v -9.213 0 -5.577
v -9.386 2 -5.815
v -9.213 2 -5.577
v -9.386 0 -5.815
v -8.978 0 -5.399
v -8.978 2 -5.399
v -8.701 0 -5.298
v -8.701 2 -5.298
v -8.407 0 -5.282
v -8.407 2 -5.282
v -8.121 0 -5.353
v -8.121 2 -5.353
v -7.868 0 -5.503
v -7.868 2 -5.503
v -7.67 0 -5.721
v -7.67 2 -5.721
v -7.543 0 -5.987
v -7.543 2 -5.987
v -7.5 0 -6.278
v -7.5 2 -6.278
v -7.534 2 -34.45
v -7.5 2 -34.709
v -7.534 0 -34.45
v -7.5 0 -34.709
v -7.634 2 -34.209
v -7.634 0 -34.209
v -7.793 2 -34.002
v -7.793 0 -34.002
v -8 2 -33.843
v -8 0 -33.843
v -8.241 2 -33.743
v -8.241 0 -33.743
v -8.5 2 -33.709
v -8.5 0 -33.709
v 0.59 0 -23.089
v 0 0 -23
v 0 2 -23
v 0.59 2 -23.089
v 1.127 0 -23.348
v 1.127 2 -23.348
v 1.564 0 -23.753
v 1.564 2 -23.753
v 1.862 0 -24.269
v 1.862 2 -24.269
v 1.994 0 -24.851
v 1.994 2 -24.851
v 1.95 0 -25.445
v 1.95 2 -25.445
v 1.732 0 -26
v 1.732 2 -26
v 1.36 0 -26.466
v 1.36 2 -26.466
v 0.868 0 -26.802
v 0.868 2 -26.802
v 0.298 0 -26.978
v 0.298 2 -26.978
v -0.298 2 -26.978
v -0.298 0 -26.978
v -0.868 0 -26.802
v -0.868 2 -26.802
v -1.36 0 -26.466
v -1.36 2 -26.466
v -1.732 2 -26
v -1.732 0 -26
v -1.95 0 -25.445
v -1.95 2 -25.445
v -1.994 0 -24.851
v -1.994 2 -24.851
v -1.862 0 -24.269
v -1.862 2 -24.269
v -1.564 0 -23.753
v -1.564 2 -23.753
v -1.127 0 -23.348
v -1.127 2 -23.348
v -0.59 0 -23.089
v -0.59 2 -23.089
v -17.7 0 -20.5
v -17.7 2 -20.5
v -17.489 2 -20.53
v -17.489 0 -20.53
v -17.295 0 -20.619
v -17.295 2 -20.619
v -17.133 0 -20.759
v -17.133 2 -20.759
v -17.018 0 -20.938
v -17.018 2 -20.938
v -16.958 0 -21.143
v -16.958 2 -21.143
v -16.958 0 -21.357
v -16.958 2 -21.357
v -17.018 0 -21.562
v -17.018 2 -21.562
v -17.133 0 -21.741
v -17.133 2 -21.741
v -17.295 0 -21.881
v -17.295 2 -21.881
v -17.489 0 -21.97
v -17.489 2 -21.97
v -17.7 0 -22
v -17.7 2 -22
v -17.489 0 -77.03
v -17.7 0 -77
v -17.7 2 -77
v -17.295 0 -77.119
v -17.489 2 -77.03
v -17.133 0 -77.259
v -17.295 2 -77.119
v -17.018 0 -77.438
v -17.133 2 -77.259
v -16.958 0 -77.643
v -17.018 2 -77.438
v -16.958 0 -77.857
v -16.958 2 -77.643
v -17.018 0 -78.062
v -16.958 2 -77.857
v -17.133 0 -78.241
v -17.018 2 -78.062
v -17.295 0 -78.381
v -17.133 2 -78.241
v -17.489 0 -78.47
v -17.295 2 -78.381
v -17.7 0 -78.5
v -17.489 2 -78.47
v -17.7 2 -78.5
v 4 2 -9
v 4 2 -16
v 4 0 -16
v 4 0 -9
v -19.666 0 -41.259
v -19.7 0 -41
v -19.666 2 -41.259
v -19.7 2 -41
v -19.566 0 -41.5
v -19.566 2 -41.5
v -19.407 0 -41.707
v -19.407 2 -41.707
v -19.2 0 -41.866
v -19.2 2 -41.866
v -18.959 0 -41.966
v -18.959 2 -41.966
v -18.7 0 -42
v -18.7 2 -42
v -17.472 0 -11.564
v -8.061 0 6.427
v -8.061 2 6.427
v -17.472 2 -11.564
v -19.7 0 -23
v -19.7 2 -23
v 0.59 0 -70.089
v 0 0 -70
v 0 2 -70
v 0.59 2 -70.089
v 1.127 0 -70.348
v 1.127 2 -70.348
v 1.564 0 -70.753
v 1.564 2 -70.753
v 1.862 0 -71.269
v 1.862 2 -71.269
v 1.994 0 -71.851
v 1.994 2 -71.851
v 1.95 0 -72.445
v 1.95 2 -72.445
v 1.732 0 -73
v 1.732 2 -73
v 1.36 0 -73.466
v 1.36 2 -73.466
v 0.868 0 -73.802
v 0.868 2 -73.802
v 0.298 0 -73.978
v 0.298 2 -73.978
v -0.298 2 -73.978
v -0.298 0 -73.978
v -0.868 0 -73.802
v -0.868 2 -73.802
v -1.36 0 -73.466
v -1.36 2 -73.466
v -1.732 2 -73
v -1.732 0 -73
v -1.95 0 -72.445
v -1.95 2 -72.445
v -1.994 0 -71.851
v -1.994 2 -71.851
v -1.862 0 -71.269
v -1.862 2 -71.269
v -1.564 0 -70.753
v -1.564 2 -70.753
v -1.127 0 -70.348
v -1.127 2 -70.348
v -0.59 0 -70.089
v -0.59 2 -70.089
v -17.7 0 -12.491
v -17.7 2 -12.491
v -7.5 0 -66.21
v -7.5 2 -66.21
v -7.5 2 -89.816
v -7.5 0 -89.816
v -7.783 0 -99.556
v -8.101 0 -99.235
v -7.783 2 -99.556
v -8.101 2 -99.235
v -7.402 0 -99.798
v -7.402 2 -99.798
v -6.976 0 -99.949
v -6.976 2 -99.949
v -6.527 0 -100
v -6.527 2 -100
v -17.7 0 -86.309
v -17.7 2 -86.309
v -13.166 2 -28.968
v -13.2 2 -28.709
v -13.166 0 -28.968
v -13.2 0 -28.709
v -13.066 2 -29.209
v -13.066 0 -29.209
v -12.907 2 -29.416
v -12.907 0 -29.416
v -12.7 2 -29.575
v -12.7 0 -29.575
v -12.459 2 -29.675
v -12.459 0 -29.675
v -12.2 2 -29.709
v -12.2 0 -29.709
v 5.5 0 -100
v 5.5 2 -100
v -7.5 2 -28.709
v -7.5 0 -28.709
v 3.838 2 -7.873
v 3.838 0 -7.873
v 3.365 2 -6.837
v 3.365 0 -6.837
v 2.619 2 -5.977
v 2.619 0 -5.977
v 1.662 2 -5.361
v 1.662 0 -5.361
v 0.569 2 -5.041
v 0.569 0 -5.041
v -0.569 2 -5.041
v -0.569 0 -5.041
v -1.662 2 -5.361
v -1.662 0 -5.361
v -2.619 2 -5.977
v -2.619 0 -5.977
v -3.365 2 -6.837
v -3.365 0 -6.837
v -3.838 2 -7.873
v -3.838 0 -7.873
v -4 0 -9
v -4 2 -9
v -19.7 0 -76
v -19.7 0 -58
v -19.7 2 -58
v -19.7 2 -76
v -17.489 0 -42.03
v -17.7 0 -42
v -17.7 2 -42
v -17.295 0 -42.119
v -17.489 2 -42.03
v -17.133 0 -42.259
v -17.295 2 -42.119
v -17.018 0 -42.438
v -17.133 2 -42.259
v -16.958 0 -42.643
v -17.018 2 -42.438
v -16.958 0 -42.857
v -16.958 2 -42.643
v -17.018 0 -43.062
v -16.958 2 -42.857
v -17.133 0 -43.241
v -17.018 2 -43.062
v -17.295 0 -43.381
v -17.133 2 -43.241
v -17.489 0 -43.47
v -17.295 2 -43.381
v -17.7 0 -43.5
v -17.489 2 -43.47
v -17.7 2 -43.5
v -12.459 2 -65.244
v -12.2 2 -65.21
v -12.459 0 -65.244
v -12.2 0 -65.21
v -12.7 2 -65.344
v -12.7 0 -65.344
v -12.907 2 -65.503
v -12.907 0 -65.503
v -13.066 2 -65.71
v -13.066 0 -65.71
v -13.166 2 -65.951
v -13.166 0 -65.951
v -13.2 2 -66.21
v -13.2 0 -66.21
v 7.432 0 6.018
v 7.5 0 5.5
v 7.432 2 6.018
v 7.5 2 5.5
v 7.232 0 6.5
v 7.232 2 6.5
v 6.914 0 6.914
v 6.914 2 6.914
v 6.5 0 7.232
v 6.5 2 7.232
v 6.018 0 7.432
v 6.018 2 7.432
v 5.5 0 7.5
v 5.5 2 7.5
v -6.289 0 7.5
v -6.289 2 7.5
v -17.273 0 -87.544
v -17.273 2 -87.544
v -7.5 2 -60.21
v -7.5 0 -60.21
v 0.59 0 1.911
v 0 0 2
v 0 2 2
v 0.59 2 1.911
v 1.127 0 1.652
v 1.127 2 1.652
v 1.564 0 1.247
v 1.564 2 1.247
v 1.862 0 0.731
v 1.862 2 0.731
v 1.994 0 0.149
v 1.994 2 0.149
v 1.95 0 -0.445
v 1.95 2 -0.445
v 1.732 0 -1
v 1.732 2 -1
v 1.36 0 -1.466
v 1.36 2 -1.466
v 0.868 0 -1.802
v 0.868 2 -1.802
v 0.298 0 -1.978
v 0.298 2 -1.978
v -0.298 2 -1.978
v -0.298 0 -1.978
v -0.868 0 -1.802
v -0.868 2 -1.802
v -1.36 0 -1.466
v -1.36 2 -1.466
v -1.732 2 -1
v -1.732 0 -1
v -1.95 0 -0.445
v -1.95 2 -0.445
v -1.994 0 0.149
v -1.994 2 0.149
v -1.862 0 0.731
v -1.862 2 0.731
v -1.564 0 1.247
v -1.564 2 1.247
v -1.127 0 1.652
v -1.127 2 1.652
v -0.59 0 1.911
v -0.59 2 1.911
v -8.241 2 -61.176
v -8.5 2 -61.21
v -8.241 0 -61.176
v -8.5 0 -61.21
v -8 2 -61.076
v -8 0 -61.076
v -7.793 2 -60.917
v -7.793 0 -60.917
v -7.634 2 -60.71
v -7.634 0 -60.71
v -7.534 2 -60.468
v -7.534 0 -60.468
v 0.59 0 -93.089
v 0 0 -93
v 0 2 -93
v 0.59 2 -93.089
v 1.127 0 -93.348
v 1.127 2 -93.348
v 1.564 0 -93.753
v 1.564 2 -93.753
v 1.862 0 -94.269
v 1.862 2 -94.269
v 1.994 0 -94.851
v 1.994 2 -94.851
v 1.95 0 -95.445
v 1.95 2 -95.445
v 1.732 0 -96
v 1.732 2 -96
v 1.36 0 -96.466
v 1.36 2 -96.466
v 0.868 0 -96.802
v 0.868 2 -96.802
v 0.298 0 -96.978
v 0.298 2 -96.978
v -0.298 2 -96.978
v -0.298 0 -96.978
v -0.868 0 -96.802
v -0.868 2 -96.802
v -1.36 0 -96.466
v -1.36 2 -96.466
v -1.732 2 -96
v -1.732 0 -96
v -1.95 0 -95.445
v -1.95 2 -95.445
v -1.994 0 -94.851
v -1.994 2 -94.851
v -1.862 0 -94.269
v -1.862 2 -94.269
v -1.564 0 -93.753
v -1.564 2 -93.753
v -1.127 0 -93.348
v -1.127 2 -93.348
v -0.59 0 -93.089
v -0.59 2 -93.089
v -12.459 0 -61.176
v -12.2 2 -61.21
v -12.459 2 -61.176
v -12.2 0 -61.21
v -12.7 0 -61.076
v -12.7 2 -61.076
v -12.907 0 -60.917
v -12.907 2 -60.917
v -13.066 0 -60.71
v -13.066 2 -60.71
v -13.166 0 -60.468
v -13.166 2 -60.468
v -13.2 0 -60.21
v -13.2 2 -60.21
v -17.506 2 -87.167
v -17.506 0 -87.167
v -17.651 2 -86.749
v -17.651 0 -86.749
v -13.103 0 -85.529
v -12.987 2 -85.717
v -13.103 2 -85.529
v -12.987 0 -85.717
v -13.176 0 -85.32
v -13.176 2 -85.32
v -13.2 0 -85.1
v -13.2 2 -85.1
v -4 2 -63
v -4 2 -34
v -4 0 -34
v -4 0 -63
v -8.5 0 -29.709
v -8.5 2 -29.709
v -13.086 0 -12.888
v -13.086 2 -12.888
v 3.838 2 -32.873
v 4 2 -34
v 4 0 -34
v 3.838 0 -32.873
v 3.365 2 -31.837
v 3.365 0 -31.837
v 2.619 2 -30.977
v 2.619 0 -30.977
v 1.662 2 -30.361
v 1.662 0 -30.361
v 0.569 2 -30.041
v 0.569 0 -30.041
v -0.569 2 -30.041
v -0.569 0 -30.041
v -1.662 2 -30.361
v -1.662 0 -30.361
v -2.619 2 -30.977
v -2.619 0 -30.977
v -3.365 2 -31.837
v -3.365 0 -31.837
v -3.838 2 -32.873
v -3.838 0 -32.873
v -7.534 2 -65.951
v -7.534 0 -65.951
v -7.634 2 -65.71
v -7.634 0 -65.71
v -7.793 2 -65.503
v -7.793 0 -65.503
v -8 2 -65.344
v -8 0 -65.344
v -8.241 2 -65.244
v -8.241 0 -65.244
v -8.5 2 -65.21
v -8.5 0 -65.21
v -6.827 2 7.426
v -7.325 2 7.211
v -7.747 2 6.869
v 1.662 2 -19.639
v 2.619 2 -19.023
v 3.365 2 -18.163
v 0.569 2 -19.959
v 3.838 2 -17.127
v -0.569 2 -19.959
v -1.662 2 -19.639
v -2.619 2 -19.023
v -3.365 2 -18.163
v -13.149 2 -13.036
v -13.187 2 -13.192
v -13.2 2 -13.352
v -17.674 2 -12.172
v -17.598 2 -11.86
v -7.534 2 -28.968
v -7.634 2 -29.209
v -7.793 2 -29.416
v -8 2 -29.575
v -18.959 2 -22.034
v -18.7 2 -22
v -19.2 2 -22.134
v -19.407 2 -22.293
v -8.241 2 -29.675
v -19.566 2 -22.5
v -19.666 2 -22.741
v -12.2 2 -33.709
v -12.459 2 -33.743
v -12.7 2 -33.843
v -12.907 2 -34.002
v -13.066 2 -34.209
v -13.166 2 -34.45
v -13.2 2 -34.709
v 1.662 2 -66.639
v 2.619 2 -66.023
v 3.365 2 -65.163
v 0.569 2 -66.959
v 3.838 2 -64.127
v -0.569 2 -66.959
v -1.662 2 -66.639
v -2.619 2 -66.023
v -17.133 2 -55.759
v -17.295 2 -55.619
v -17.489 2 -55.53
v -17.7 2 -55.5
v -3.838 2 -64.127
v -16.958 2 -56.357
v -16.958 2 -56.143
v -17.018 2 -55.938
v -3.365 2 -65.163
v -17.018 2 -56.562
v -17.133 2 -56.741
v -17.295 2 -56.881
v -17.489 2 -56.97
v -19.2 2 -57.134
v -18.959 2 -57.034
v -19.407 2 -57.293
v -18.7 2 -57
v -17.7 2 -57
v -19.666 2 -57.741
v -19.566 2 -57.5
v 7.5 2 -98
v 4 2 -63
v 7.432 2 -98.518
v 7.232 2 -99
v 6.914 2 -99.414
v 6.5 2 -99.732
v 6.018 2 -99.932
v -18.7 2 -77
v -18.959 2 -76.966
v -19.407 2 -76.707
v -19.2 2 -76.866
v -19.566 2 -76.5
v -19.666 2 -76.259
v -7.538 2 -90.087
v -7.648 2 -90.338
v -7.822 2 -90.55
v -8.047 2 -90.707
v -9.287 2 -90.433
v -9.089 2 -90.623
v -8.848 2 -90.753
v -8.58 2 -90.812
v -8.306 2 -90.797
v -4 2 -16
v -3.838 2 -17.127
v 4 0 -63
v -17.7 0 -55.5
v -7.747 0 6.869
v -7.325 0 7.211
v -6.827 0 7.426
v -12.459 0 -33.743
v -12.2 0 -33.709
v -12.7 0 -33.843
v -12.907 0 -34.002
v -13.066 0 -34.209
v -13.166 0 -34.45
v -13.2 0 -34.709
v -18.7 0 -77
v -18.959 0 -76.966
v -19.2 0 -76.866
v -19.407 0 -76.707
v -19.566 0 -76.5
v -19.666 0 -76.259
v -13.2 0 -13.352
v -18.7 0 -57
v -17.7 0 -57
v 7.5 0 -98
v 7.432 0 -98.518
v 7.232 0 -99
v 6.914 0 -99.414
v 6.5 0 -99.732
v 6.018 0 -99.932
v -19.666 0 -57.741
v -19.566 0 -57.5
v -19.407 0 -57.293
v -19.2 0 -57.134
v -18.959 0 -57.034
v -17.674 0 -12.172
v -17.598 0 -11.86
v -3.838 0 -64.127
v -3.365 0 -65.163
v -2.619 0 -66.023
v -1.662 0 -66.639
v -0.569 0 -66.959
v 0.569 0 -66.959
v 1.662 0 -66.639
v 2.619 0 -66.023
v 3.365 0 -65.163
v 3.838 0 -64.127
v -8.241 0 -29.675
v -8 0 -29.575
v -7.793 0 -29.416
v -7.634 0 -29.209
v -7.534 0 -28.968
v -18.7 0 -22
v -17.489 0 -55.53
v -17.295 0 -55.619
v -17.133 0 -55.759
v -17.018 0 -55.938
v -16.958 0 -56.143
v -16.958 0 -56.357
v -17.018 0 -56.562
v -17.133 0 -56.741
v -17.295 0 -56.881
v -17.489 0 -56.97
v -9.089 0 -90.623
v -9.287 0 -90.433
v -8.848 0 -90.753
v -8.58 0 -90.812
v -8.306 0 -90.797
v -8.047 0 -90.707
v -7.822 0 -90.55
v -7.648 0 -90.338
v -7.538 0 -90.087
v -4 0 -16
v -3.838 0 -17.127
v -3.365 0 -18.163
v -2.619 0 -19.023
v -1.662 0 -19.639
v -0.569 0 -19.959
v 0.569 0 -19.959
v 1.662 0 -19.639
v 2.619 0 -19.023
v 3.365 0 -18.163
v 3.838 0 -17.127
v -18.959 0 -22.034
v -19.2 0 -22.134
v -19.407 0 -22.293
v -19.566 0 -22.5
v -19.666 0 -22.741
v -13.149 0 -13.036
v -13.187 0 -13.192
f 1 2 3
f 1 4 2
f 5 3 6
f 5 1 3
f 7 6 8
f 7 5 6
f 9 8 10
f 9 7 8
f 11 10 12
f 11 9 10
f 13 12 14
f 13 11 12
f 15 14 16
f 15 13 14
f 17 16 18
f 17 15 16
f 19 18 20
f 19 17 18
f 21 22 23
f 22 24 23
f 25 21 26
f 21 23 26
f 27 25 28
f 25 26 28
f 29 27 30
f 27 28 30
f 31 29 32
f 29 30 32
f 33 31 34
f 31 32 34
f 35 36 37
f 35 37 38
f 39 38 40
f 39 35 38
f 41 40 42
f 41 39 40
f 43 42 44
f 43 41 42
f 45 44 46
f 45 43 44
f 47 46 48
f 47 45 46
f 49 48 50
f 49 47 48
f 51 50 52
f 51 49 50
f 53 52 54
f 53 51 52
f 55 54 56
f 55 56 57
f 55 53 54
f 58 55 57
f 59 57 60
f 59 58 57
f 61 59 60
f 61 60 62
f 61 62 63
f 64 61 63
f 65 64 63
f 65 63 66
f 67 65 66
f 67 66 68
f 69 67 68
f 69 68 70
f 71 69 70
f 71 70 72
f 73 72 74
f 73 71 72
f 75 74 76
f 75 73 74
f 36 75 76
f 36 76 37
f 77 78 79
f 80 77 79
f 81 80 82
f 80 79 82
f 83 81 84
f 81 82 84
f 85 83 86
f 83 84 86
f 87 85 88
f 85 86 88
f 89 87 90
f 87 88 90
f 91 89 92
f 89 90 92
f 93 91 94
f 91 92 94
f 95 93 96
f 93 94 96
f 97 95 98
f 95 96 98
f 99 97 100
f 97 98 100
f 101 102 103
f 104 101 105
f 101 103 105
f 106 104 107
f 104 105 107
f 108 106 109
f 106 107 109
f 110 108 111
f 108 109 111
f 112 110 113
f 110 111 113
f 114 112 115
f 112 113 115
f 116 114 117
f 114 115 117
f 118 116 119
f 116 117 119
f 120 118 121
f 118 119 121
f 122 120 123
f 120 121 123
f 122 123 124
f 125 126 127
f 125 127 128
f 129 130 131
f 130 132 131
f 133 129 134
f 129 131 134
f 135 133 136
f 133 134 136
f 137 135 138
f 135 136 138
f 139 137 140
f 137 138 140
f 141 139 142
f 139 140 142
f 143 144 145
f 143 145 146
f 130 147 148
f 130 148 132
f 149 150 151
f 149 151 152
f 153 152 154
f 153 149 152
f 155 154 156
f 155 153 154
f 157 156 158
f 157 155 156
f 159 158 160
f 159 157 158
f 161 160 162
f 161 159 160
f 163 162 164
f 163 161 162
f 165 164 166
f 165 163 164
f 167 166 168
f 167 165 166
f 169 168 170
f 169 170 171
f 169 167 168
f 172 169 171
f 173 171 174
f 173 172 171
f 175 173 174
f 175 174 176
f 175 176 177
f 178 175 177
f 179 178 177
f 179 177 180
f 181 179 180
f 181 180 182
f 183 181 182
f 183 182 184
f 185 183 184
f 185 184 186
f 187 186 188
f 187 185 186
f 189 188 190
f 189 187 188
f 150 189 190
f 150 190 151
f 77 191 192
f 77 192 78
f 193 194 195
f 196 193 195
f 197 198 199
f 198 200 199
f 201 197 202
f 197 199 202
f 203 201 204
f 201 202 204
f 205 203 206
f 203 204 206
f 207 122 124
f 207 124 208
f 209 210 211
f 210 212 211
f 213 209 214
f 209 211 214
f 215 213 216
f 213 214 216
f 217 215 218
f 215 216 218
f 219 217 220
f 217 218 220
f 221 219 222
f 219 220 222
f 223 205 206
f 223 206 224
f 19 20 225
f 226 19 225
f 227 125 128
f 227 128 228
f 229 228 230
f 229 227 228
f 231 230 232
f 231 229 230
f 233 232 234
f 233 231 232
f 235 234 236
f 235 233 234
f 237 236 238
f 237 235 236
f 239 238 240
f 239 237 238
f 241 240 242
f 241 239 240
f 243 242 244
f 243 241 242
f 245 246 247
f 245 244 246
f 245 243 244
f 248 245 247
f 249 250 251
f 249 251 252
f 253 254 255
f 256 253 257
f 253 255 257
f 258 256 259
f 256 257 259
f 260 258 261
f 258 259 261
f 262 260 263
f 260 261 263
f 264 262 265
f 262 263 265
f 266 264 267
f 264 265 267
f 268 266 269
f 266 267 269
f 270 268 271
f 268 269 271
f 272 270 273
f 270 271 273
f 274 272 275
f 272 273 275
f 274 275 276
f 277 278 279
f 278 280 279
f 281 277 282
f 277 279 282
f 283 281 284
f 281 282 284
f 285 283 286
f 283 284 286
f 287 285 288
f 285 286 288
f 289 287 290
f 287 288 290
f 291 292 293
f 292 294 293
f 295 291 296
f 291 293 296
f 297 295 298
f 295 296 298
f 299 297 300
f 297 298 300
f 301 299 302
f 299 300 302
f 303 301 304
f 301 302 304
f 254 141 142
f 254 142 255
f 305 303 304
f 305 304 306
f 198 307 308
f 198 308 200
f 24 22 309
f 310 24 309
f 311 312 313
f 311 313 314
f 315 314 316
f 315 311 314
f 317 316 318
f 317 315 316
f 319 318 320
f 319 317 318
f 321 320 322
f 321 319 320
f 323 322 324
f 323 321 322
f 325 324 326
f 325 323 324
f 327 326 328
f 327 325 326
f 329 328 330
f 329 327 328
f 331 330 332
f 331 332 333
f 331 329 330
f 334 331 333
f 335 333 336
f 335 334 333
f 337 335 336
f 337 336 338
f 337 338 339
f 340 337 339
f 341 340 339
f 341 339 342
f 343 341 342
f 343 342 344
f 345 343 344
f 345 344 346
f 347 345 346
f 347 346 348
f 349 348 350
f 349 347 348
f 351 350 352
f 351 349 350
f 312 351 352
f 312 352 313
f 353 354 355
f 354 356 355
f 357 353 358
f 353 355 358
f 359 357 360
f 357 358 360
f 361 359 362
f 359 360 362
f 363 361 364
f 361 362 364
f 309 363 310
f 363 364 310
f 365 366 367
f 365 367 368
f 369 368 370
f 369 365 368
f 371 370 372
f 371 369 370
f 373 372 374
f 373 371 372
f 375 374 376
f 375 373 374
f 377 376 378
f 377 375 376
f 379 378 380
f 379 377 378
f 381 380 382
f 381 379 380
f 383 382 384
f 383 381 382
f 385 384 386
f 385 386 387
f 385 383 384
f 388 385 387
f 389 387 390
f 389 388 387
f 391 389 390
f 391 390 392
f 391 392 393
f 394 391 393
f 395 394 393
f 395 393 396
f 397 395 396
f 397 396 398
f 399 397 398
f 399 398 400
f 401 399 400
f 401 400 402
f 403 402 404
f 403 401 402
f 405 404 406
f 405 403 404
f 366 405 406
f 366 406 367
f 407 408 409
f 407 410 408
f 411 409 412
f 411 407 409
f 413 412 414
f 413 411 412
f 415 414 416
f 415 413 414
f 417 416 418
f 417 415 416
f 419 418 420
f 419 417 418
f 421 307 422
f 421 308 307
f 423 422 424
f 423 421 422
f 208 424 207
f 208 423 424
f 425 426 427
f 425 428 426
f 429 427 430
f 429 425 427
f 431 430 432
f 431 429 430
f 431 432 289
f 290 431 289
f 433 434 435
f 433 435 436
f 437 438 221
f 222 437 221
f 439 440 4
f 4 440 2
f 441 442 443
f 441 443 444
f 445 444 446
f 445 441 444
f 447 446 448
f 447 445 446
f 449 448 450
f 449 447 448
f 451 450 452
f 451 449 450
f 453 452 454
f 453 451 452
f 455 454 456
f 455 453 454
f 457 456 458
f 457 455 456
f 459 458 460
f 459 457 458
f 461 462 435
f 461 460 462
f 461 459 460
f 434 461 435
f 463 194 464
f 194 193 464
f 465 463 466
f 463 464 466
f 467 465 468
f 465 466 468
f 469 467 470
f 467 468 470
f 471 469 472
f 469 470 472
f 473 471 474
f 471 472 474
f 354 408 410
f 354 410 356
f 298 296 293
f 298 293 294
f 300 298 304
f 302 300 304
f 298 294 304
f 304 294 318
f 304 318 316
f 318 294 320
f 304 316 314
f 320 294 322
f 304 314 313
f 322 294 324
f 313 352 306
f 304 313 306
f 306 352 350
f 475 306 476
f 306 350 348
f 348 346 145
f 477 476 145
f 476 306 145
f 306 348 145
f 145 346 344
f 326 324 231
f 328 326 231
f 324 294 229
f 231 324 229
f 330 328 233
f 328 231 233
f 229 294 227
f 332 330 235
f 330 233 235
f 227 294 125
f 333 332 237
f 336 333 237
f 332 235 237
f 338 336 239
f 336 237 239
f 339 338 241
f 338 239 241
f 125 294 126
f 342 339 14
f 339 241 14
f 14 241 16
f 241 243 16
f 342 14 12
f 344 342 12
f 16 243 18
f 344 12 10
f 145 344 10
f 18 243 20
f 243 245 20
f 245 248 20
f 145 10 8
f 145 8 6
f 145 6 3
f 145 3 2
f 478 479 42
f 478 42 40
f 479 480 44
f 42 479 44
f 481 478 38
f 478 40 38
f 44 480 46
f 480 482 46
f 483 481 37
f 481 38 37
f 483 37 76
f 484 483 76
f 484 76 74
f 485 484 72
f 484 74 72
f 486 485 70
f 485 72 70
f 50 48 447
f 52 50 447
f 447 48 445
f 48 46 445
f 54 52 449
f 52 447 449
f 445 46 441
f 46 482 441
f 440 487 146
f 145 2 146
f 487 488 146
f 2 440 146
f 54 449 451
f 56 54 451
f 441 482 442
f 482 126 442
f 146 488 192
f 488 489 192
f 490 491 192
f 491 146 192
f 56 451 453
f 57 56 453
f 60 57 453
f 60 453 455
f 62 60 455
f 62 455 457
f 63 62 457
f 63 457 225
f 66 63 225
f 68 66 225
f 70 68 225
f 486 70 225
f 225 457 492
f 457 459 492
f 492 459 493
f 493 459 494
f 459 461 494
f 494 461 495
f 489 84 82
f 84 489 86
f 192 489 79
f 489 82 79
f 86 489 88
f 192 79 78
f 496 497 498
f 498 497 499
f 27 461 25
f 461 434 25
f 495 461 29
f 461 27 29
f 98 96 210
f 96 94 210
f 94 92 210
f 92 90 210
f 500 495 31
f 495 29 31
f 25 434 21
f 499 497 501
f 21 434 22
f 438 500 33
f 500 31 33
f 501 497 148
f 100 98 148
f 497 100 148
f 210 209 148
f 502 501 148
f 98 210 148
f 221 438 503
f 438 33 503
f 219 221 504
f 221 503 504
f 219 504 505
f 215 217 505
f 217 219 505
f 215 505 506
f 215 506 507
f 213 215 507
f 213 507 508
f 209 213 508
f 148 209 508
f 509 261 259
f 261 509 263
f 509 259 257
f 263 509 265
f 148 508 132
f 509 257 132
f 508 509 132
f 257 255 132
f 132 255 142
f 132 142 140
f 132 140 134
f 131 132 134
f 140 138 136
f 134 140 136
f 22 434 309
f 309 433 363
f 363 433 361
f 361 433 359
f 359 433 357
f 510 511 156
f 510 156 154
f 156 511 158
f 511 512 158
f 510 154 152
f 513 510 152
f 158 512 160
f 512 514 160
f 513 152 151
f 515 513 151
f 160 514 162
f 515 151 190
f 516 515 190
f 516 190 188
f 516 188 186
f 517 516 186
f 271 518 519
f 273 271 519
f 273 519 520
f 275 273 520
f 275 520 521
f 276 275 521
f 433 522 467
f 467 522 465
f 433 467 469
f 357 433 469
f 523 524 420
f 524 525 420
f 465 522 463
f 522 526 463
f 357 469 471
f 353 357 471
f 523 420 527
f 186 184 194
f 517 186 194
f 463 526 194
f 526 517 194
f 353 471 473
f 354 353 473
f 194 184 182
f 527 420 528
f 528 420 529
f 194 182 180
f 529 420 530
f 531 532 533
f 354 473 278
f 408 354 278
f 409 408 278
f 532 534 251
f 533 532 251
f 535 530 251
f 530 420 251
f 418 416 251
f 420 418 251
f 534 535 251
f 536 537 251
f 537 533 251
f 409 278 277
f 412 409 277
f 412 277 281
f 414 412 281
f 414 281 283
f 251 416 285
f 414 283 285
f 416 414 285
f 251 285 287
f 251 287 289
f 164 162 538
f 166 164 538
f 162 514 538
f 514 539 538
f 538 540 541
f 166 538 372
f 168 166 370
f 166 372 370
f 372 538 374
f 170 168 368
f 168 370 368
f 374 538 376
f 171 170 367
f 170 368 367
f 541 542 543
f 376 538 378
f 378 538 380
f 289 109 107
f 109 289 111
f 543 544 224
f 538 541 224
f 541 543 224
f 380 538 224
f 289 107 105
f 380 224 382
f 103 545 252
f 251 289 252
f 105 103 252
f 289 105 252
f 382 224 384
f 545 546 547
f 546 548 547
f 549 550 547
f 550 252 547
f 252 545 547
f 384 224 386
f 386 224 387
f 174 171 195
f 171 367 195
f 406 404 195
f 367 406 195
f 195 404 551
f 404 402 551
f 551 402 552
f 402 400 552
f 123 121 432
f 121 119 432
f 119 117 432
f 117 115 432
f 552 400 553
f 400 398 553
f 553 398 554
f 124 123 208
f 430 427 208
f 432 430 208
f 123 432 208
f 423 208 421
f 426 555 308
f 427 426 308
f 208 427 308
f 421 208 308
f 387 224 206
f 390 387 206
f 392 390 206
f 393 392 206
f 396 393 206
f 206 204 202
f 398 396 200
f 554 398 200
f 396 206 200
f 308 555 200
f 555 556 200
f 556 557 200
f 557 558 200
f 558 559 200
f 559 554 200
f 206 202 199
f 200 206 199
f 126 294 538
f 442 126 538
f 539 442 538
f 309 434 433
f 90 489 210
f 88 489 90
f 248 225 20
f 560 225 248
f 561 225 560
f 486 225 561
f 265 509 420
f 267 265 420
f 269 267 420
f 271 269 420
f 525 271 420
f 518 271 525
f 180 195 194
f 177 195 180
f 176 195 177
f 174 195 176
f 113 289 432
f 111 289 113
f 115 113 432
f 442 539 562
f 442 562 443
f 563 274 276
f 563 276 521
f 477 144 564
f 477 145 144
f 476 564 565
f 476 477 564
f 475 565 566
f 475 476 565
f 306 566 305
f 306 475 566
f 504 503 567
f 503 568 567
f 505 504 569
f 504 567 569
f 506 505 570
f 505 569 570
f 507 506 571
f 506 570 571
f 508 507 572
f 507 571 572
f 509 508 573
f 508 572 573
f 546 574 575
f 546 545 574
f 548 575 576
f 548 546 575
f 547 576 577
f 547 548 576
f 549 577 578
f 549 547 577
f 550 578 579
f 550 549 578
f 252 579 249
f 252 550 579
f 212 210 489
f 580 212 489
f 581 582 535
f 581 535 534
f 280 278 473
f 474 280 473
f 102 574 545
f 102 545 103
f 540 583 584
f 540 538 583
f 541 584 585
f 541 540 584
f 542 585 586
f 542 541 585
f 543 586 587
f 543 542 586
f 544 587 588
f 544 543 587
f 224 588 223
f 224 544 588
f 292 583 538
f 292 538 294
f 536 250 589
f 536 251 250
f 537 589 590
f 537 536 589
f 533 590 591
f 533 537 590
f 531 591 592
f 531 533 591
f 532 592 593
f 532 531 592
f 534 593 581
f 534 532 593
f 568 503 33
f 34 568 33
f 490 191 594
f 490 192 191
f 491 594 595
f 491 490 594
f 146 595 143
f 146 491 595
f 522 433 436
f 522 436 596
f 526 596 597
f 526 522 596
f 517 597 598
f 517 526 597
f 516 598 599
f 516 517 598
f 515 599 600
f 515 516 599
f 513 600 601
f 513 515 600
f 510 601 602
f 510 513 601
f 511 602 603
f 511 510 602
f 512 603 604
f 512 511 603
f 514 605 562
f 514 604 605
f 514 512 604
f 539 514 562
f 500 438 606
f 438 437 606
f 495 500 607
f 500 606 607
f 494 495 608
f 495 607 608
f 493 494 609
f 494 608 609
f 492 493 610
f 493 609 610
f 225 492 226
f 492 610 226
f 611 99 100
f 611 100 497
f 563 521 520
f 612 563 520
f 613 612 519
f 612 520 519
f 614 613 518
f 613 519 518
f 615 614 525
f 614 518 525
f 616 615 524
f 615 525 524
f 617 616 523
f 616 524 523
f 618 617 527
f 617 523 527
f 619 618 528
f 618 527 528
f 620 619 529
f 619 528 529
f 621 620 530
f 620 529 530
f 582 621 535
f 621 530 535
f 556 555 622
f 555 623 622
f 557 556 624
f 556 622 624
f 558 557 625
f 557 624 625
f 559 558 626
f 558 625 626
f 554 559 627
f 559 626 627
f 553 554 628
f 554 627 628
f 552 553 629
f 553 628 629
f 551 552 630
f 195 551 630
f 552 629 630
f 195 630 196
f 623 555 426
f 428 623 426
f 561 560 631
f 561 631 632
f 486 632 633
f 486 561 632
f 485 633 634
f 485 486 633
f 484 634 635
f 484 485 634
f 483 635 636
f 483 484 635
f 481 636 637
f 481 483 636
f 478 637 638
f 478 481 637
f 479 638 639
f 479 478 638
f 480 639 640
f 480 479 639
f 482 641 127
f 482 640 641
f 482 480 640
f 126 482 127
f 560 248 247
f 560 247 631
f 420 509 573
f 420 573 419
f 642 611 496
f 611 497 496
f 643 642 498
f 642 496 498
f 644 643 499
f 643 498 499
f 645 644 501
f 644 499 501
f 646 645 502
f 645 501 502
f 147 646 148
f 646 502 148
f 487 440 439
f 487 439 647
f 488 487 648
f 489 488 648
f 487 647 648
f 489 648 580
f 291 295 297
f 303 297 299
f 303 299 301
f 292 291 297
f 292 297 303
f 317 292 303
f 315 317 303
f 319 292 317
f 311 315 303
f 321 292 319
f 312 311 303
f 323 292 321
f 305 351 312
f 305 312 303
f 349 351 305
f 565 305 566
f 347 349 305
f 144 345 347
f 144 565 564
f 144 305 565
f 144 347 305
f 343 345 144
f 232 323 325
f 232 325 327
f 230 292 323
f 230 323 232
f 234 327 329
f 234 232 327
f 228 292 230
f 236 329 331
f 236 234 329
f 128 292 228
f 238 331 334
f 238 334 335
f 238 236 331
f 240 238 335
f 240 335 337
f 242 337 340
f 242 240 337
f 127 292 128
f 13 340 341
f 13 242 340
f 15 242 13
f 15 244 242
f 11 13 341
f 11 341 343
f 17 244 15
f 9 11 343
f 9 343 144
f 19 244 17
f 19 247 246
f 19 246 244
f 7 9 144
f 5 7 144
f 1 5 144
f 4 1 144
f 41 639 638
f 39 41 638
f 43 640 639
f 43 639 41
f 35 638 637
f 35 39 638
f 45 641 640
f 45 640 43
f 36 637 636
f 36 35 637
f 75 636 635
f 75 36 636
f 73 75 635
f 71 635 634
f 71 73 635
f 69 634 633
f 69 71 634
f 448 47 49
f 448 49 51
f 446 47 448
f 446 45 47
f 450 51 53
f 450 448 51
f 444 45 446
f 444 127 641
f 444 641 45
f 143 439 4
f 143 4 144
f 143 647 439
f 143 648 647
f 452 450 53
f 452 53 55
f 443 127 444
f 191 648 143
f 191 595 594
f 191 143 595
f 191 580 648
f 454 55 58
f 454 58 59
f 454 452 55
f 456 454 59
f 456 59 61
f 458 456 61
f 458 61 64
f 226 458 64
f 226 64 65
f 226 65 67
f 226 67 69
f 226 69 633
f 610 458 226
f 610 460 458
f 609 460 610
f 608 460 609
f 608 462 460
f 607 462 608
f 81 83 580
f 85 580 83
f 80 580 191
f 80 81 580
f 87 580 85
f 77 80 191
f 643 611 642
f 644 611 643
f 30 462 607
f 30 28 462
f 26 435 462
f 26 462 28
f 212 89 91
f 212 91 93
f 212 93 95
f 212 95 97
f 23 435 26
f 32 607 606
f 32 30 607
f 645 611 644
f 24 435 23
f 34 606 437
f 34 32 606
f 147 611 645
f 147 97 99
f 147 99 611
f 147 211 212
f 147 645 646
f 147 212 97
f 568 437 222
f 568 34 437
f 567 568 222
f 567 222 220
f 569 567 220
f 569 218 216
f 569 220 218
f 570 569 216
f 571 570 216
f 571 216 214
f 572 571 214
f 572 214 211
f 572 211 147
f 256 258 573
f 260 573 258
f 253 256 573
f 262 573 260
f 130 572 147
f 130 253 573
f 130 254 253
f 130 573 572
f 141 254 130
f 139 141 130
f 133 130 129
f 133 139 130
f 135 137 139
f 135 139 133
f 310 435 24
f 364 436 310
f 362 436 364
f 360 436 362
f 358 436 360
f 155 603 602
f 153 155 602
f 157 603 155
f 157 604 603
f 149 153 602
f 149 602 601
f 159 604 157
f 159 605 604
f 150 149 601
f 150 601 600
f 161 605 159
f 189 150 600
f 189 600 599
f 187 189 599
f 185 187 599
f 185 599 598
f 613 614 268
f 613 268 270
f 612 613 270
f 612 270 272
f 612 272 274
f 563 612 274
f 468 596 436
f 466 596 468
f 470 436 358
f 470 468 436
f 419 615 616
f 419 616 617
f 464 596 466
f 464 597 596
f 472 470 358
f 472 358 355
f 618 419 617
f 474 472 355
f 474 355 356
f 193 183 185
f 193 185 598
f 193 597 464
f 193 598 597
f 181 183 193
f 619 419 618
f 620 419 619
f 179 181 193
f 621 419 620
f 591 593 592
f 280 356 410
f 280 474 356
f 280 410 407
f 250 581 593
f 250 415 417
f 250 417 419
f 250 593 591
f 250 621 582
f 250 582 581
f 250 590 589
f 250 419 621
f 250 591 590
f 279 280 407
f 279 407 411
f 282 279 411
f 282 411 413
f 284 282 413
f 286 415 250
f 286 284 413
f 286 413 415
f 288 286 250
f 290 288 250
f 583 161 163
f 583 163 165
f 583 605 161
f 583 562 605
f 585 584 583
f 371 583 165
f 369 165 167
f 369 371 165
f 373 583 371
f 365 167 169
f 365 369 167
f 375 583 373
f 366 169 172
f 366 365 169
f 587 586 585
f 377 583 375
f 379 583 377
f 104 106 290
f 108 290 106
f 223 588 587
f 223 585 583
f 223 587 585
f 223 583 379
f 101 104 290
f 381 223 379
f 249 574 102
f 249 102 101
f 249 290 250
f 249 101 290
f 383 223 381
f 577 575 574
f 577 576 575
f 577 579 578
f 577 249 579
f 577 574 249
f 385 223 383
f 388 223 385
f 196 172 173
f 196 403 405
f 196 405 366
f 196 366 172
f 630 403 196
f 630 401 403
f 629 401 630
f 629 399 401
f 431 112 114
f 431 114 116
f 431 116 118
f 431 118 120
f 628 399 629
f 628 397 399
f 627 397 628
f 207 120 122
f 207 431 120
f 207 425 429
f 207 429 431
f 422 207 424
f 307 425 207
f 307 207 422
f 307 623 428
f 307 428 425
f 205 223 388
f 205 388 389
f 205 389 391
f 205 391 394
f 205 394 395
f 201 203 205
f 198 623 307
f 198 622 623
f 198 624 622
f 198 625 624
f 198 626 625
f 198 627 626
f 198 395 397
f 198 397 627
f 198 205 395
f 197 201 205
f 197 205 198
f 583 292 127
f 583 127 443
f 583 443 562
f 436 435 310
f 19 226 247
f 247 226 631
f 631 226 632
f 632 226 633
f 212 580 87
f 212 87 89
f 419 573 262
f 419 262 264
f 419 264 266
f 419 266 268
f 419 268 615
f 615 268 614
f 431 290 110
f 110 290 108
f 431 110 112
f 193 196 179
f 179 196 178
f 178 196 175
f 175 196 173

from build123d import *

# Parameters (mm, degrees)
SKETCH_1_R          = 2
EXTRUDE_1_DEPTH     = 2
SKETCH_2_R          = 0.75
CUT_EXTRUDE_1_DEPTH = 102.941600929
FILLET_1_R          = 2
SKETCH_3_W          = 5.7
SKETCH_3_H          = 27.500414906
CUT_EXTRUDE_2_DEPTH = 102.941600929
FILLET_2_R          = 1


with BuildPart() as part:
    # 草图1 → 凸台-拉伸1 (new body)
    with BuildSketch(Plane(origin=(0, 0, 0), x_dir=(1, 0, 0), z_dir=(0, 1, 0))):
        Polygon((7.5, 100), (7.5, -7.5), (-7.5, -7.5), (-17.7, 12), (-17.7, 22), (-19.7, 22), (-19.7, 42), (-17.7, 42), (-17.7, 57), (-19.7, 57), (-19.7, 77), (-17.7, 77), (-17.7, 87), (-7.5, 100), align=None)
        with Locations(Location((0, 25, 0), (0, 0, 270))):
            Circle(SKETCH_1_R, mode=Mode.SUBTRACT)
        with Locations(Location((0, 0, 0), (0, 0, 270))):
            Circle(SKETCH_1_R, mode=Mode.SUBTRACT)
        with Locations(Location((0, 72, 0), (0, 0, 270))):
            Circle(SKETCH_1_R, mode=Mode.SUBTRACT)
        with Locations(Location((0, 95, 0), (0, 0, 270))):
            Circle(SKETCH_1_R, mode=Mode.SUBTRACT)
    extrude(amount=EXTRUDE_1_DEPTH)

    # 草图2 → 切除-拉伸1 (cut, through all)
    with BuildSketch(Plane(origin=(0, 2, 0), x_dir=(1, 0, 0), z_dir=(0, 1, 0))):
        with Locations((-17.7, 77.75)):
            Circle(SKETCH_2_R)
        with Locations((-17.7, 56.25)):
            Circle(SKETCH_2_R)
        with Locations((-17.7, 42.75)):
            Circle(SKETCH_2_R)
        with Locations((-17.7, 21.25)):
            Circle(SKETCH_2_R)
    extrude(amount=-CUT_EXTRUDE_1_DEPTH, mode=Mode.SUBTRACT)

    # 圆角1
    fillet_1_edges = [part.edges().sort_by_distance(p)[0] for p in [
        (-17.7, 1, -87),
        (-7.5, 1, -100),
        (7.5, 1, -100),
        (7.5, 1, 7.5),
        (-7.5, 1, 7.5),
        (-17.7, 1, -12),
    ]]
    fillet(fillet_1_edges, radius=FILLET_1_R)

    # 草图3 → 切除-拉伸2 (cut, through all)
    with BuildSketch(Plane(origin=(0, 2, 0), x_dir=(1, 0, 0), z_dir=(0, 1, 0))):
        with BuildLine():
            Line((-4, 9), (-4, 16))
            ThreePointArc((-4, 16), (0, 20), (4, 16))
            Line((4, 16), (4, 9))
            ThreePointArc((4, 9), (0, 5), (-4, 9))
        make_face()
        with BuildLine():
            Line((4, 63), (4, 34))
            ThreePointArc((4, 34), (0, 30), (-4, 34))
            Line((-4, 34), (-4, 63))
            ThreePointArc((-4, 63), (0, 67), (4, 63))
        make_face()
        Polygon((-7.5, 92.710034389), (-13.2, 85.445328506), (-13.2, 65.209619483), (-7.5, 65.209619483), align=None)
        Polygon((-13.2, 13.105848495), (-7.5, 2.208789672), (-7.5, 29.709204577), (-13.2, 29.709204577), align=None)
        with Locations((-10.35, 47.45941203)):
            Rectangle(SKETCH_3_W, SKETCH_3_H)
    extrude(amount=-CUT_EXTRUDE_2_DEPTH, mode=Mode.SUBTRACT)

    # 圆角2
    fillet_2_edges = [part.edges().sort_by_distance(p)[0] for p in [
        (-7.5, 1, -92.710034389),
        (-7.5, 1, -65.209619483),
        (-13.2, 1, -65.209619483),
        (-13.2, 1, -85.445328506),
        (-7.5, 1, -29.709204577),
        (-7.5, 1, -2.208789672),
        (-13.2, 1, -13.105848495),
        (-13.2, 1, -29.709204577),
        (-13.2, 1, -33.709204577),
        (-13.2, 1, -61.209619483),
        (-7.5, 1, -61.209619483),
        (-7.5, 1, -33.709204577),
        (-19.7, 1, -22),
        (-19.7, 1, -42),
        (-19.7, 1, -57),
        (-19.7, 1, -77),
    ]]
    fillet(fillet_2_edges, radius=FILLET_2_R)


solid = part.part
